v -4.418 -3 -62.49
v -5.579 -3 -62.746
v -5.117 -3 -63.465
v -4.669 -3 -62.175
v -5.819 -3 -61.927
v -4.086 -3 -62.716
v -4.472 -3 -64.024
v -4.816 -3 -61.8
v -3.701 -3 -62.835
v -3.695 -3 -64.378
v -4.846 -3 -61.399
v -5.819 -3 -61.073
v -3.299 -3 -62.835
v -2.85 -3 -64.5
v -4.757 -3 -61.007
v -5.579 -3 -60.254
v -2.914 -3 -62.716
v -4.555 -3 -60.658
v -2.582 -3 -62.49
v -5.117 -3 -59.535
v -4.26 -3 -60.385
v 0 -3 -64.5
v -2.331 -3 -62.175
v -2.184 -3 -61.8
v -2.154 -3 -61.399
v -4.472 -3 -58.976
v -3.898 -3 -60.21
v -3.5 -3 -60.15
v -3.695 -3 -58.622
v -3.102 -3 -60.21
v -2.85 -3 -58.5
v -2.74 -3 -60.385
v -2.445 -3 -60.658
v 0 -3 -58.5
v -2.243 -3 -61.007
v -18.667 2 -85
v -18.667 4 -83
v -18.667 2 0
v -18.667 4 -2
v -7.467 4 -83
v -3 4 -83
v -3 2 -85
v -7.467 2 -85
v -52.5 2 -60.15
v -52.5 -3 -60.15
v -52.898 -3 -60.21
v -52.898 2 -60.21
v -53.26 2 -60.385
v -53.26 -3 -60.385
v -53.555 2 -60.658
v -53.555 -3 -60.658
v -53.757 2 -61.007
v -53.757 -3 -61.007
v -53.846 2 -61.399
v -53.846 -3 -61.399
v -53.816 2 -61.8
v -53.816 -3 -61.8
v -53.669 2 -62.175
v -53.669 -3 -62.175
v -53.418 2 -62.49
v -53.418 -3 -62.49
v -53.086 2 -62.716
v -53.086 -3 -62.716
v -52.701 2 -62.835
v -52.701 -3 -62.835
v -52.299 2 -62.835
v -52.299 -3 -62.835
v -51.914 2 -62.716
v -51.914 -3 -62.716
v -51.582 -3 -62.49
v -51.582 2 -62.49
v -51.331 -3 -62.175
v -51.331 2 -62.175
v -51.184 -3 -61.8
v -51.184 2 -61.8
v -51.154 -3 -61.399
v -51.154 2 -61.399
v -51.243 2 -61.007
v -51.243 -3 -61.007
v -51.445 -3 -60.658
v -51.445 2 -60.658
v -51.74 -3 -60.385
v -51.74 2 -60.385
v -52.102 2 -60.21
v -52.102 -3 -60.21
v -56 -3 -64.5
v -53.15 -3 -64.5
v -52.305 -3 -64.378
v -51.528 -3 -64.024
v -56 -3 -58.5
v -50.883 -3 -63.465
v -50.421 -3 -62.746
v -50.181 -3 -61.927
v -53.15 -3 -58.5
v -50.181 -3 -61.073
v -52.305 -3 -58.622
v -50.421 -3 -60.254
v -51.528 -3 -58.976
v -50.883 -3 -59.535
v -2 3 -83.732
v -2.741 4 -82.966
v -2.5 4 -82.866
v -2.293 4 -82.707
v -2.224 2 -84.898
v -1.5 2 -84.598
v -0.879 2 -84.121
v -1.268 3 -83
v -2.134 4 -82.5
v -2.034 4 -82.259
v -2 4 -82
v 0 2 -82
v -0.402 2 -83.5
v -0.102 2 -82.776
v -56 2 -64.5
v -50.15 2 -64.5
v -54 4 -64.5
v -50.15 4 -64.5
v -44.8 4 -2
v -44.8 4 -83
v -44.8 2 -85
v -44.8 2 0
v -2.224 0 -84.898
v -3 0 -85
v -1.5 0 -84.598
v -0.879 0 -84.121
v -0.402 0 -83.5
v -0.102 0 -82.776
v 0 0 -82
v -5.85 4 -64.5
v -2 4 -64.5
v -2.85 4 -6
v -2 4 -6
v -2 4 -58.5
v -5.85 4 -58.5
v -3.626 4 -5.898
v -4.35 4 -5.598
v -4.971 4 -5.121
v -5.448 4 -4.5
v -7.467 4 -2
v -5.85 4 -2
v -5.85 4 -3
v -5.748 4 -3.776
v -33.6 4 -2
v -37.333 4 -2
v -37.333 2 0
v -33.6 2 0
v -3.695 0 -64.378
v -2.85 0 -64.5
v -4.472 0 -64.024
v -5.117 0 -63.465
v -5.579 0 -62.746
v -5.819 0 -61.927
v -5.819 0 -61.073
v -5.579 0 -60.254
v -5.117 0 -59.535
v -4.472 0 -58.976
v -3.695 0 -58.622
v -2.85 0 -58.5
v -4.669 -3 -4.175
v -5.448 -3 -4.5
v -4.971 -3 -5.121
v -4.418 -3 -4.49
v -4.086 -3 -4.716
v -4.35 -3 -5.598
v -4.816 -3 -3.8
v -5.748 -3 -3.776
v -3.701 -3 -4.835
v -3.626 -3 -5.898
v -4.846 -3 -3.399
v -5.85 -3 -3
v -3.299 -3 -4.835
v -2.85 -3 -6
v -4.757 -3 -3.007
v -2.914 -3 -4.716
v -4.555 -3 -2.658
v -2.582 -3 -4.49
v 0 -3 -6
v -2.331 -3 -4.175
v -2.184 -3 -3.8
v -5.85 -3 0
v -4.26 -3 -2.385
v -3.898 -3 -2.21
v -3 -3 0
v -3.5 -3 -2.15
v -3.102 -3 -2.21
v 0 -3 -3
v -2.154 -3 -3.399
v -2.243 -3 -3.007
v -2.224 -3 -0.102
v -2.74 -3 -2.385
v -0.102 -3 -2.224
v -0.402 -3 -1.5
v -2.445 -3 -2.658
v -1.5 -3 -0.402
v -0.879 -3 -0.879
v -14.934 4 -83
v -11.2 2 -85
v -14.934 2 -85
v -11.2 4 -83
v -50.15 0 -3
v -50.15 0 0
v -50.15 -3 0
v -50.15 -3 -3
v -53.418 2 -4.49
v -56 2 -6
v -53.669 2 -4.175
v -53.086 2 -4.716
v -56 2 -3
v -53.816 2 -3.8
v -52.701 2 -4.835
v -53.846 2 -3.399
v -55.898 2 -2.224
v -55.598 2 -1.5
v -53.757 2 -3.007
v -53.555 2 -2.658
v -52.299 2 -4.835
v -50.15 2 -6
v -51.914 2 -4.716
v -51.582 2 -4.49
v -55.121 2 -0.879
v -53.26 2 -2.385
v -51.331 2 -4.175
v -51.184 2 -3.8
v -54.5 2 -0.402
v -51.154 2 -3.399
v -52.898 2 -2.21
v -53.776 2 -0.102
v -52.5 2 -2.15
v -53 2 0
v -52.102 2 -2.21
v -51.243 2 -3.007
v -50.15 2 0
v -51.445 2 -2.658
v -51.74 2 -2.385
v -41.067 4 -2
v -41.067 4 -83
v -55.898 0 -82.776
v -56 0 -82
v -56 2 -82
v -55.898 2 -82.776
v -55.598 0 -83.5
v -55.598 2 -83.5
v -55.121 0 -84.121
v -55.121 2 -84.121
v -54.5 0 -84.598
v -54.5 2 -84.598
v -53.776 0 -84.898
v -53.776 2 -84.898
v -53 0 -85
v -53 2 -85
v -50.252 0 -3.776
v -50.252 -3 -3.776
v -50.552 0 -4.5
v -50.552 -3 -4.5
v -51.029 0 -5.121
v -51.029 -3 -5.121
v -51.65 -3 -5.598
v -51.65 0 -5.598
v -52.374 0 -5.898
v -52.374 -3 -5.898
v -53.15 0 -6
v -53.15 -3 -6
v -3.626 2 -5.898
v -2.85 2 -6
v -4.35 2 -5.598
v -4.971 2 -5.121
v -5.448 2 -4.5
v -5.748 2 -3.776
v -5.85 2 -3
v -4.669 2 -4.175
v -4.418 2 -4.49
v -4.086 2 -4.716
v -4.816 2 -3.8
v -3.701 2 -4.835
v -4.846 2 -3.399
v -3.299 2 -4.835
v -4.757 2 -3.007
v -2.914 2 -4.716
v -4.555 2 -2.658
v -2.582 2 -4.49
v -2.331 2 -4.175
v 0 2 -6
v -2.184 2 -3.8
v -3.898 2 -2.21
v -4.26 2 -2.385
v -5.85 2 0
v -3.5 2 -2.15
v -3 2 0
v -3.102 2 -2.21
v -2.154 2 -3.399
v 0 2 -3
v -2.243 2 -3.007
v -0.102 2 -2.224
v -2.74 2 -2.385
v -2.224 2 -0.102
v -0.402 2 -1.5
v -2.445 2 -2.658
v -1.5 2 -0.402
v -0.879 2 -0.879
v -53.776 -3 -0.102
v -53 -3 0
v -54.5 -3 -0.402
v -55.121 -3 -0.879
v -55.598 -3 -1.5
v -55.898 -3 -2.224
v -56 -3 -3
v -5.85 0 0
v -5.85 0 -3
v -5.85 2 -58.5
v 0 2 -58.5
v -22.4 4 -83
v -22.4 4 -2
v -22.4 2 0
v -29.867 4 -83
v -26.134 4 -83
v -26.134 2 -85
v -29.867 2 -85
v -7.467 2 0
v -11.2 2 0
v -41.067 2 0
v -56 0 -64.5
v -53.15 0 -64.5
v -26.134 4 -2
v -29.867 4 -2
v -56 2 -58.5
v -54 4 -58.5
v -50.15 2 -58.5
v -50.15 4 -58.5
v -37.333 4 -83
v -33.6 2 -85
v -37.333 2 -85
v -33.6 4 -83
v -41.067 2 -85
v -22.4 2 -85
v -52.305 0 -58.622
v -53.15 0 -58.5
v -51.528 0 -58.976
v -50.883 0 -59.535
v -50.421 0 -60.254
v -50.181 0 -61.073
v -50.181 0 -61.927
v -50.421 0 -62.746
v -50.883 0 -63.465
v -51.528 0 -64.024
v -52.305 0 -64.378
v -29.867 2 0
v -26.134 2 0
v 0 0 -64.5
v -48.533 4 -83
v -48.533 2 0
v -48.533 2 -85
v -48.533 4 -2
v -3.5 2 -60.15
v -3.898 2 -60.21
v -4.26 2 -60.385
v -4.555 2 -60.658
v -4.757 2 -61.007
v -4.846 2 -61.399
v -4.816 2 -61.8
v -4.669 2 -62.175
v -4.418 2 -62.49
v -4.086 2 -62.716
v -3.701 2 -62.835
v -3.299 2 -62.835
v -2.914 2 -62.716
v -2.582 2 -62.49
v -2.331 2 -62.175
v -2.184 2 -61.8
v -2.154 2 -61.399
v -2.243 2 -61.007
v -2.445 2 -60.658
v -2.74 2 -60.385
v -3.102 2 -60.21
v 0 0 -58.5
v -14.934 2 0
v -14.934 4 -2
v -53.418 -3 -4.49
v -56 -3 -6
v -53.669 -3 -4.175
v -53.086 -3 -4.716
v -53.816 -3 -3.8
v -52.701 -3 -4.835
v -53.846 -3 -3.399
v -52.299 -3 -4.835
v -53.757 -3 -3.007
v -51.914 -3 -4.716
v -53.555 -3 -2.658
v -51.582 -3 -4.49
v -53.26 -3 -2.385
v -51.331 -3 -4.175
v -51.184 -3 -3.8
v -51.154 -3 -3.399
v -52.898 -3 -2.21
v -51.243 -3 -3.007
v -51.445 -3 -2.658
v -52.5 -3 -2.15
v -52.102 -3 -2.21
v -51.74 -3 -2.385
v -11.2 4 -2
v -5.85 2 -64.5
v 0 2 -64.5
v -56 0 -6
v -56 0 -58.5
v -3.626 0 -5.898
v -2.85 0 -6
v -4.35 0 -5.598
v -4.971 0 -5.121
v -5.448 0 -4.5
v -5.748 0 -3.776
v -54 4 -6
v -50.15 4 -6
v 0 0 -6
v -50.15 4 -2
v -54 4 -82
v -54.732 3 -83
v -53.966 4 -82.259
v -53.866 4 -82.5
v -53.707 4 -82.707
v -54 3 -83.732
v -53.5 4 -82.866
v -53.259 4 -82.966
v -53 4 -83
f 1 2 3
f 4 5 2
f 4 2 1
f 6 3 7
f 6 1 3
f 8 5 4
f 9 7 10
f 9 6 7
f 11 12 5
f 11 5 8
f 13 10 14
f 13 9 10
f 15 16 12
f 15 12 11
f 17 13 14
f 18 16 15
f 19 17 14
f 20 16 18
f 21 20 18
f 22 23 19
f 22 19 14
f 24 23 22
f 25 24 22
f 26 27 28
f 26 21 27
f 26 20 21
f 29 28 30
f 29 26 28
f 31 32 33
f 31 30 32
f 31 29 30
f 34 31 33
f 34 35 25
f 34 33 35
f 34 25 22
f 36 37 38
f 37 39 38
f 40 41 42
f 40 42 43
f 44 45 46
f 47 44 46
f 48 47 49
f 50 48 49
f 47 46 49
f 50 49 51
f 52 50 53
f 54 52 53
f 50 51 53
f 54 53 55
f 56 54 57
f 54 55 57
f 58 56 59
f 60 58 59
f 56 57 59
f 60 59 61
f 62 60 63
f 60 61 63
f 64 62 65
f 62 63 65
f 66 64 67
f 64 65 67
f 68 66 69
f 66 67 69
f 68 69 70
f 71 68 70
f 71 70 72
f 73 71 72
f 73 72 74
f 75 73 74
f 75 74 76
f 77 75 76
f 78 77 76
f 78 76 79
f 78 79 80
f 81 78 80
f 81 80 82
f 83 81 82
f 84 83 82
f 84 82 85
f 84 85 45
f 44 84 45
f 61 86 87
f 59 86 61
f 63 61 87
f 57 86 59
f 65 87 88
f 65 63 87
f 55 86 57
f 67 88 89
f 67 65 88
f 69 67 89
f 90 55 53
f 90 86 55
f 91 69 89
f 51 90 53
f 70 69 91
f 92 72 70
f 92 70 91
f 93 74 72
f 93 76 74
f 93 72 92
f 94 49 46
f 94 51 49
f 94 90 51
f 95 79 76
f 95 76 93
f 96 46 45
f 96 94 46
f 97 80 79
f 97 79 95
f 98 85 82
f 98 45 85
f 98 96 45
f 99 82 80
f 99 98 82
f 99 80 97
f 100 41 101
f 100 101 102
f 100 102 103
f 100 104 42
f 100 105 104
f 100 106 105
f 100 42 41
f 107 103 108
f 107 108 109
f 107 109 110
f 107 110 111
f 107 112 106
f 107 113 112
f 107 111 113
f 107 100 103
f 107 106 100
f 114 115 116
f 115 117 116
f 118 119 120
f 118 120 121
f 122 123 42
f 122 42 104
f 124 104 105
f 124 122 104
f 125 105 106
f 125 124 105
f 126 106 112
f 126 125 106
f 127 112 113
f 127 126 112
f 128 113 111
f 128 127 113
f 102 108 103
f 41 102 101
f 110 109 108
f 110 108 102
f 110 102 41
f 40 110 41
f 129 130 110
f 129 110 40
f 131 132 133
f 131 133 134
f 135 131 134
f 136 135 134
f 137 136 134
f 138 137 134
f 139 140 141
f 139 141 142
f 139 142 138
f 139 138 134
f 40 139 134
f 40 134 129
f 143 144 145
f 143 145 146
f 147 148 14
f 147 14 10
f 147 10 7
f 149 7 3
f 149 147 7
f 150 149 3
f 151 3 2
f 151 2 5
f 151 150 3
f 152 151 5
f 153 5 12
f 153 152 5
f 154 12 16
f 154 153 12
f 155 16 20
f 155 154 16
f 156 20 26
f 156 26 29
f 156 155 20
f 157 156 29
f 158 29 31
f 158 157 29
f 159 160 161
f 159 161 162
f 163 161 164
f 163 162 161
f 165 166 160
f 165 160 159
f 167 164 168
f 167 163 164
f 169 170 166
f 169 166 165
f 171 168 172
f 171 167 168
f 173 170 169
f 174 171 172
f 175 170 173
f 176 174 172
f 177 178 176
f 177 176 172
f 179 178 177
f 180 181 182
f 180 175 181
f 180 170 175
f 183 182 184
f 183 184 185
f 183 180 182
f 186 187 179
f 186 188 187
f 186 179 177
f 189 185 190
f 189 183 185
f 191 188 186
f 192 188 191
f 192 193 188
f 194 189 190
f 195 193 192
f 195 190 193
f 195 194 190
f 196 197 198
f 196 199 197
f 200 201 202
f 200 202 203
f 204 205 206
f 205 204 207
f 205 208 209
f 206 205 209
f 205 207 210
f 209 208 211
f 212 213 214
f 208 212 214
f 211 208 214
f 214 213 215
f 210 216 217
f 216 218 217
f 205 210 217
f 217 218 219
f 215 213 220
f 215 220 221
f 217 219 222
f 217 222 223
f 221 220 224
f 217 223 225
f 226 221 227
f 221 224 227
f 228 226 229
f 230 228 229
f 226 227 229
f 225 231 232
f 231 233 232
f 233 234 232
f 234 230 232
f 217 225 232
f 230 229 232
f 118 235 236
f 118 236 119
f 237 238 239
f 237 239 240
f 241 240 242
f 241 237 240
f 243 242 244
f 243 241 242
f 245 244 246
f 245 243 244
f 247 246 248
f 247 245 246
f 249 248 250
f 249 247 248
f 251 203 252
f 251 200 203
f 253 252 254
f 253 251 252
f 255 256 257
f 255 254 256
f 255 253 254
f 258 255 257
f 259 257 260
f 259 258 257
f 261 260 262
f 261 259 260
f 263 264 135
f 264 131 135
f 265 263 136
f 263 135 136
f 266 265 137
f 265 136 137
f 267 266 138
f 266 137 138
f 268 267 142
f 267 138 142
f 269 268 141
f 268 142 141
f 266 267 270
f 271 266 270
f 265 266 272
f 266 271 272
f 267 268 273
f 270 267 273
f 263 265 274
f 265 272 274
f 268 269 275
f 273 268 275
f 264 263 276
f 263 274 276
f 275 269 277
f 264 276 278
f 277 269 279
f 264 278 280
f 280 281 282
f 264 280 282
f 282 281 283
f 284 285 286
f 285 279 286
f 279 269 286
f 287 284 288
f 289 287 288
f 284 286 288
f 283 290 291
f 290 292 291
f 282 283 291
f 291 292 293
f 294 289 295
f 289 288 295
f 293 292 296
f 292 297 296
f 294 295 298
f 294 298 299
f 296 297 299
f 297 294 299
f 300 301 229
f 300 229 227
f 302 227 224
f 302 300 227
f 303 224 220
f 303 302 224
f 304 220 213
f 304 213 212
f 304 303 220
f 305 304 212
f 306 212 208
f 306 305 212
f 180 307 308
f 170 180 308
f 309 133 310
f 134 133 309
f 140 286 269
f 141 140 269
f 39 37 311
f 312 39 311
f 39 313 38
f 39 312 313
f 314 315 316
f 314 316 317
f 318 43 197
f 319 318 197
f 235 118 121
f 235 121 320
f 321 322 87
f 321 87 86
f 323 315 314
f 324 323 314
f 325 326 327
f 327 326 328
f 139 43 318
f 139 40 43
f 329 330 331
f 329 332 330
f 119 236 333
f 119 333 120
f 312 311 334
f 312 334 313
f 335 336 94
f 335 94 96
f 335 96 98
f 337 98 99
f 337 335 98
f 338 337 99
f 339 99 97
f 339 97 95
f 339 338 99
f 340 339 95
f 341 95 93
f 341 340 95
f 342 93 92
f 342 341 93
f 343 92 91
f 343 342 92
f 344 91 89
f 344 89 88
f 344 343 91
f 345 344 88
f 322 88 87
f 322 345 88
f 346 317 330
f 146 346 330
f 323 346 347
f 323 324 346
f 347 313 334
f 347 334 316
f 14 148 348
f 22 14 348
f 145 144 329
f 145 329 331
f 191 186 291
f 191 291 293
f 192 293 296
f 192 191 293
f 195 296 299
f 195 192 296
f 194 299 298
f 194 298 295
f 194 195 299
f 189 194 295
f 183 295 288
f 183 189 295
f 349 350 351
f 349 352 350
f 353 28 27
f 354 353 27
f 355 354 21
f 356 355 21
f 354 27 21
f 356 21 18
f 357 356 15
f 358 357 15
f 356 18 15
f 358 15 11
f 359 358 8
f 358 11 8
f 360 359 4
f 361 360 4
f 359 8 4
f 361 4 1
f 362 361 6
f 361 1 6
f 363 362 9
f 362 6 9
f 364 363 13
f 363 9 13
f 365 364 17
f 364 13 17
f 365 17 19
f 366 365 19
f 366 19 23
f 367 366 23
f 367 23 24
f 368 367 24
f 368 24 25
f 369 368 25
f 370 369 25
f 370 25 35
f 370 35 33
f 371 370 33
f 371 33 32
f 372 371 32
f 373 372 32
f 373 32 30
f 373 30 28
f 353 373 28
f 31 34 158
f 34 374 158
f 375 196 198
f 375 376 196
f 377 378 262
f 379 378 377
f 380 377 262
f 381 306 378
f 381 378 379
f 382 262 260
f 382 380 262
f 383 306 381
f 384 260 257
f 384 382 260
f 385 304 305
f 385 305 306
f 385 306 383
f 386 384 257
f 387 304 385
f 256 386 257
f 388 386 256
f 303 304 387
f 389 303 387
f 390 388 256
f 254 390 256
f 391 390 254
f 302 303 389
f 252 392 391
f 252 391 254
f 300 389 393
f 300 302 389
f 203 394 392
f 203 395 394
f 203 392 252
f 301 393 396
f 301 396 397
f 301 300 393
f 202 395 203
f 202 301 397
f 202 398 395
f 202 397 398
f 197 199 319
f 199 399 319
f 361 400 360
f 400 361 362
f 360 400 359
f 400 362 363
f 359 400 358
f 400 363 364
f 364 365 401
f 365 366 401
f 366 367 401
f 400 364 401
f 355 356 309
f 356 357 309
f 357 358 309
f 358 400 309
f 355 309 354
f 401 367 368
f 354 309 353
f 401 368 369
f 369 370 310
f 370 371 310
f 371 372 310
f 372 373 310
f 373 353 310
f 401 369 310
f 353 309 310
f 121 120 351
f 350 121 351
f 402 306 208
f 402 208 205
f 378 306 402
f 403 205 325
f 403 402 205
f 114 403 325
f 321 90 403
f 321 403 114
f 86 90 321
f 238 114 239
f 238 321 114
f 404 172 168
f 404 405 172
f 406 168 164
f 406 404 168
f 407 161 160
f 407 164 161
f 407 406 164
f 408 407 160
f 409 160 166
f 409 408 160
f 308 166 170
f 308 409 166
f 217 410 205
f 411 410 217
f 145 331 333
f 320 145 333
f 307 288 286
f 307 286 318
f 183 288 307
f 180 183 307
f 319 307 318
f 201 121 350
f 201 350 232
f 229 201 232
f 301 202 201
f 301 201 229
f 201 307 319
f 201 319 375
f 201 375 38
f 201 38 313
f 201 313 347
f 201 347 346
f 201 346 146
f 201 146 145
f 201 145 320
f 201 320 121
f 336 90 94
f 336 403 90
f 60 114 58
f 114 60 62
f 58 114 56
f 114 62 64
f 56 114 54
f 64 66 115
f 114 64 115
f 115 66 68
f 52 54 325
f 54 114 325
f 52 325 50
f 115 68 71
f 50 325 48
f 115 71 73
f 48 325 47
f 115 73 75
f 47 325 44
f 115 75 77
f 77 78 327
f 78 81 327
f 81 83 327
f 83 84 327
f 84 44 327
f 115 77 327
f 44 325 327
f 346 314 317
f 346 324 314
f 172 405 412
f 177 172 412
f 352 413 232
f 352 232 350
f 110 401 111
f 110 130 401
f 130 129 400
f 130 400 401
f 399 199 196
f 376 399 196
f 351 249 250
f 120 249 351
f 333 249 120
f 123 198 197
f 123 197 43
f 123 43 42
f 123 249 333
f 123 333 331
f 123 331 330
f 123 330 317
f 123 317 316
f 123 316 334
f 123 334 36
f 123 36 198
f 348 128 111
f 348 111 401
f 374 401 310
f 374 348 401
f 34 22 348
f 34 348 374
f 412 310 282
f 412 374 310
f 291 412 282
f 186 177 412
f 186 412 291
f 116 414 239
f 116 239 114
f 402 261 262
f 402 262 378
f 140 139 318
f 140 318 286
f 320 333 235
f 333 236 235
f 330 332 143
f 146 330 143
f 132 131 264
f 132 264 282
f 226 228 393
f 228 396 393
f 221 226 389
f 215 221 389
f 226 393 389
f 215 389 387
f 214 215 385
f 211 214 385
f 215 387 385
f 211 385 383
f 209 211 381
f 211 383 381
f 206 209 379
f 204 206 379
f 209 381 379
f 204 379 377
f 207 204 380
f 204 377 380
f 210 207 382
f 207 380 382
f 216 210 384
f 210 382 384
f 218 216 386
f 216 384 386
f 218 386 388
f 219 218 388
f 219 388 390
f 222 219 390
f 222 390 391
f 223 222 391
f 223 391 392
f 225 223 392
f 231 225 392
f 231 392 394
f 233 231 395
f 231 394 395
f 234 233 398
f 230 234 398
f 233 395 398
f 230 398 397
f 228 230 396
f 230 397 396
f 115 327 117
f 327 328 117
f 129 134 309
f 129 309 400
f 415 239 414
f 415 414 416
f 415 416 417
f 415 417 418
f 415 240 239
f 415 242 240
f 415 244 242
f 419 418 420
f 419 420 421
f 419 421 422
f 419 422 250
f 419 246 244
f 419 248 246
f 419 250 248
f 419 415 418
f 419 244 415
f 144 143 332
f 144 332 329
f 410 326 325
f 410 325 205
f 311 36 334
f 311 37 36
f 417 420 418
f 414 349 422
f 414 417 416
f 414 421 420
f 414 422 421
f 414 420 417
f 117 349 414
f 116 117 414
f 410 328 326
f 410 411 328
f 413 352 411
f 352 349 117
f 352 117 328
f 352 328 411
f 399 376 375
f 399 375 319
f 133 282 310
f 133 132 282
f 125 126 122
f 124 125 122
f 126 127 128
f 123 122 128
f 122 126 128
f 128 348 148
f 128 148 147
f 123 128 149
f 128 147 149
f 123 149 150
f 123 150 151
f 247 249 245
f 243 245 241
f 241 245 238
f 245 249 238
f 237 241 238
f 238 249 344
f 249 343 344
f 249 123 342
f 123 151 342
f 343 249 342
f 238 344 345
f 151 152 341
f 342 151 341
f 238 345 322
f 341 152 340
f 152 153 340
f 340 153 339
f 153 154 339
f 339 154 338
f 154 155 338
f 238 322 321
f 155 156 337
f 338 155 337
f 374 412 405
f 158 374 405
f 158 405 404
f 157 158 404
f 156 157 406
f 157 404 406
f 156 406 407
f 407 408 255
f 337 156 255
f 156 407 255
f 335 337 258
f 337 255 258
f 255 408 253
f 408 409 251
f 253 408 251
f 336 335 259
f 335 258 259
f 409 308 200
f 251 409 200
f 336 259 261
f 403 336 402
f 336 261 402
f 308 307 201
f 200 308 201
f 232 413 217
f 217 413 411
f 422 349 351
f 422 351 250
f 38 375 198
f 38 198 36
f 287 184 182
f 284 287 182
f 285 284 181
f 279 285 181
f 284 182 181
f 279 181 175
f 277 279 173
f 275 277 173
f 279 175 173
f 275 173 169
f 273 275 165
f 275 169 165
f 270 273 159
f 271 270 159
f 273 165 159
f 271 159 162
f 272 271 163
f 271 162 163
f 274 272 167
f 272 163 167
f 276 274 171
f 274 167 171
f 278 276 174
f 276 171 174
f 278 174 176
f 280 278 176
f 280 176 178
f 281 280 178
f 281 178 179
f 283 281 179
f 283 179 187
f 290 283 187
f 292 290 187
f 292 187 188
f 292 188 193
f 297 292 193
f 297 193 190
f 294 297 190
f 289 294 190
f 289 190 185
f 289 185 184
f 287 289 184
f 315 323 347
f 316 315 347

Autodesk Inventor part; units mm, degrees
ref_plane "YZ Plane" through (0, 0, 0) normal (1, 0, 0) x (0, 1, 0)
ref_plane "XZ Plane" through (0, 0, 0) normal (0, 1, 0) x (-1, 0, 0)
ref_plane "XY Plane" through (0, 0, 0) normal (0, 0, 1) x (1, 0, 0)
sketch "Sketch1" plane through (0, 0, 0) normal (0, 1, 0) x (-1, 0, 0)
  line L0 (3, 0) -> (53, 0)
  line L1 (56, -3) -> (56, -82)
  line L2 (53, -85) -> (3, -85)
  line L3 (0, -82) -> (0, -3)
  arc A0 (56, -3) -> (53, 0) centre (53, -3) ccw
  arc A1 (53, -85) -> (56, -82) centre (53, -82) ccw
  arc A2 (0, -82) -> (3, -85) centre (3, -82) ccw
  arc A3 (3, 0) -> (0, -3) centre (3, -3) ccw
  point P0 (0, 0)
  point P1 (56, 0)
  point P2 (0, -85)
  dimension "d0" = 56
  dimension "d1" = 85
  dimension "d2" = 3
extrude "Extrusion1" add sketch "Sketch1" along normal blind 4
chamfer "Chamfer1" distance 2 angle 45 8 edges at (0, 4, -42.5) (-0.8787, 4, -84.1213) (-28, 4, -85) (-55.1213, 4, -84.1213) (-56, 4, -42.5) (-55.1213, 4, -0.8787) (-28, 4, 0) (-0.8787, 4, -0.8787)
sketch "Sketch2" plane through (0, 0, 0) normal (0, 1, 0) x (-1, 0, 0)
  line L0 (53, 0) -> (3, 0) projected
  line L1 (3, -85) -> (53, -85) projected
  line L2 (44.8, 0) -> (48.5333, 0)
  line L3 (48.5333, 0) -> (48.5333, -85)
  line L4 (48.5333, -85) -> (44.8, -85)
  line L5 (44.8, -85) -> (44.8, 0)
  line L6 (56, -82) -> (56, -3) projected
  line L7 (41.0667, 0) -> (44.8, 0)
  line L8 (44.8, 0) -> (44.8, -85)
  line L9 (44.8, -85) -> (41.0667, -85)
  line L10 (41.0667, -85) -> (41.0667, 0)
  line L11 (37.3334, 0) -> (41.0667, 0)
  line L12 (41.0667, 0) -> (41.0667, -85)
  line L13 (41.0667, -85) -> (37.3334, -85)
  line L14 (37.3334, -85) -> (37.3334, 0)
  line L15 (33.6001, 0) -> (37.3334, 0)
  line L16 (37.3334, 0) -> (37.3334, -85)
  line L17 (37.3334, -85) -> (33.6001, -85)
  line L18 (33.6001, -85) -> (33.6001, 0)
  line L19 (29.8668, 0) -> (33.6001, 0)
  line L20 (33.6001, 0) -> (33.6001, -85)
  line L21 (33.6001, -85) -> (29.8668, -85)
  line L22 (29.8668, -85) -> (29.8668, 0)
  line L23 (26.1335, 0) -> (29.8668, 0)
  line L24 (29.8668, 0) -> (29.8668, -85)
  line L25 (29.8668, -85) -> (26.1335, -85)
  line L26 (26.1335, -85) -> (26.1335, 0)
  line L27 (22.4002, 0) -> (26.1335, 0)
  line L28 (26.1335, 0) -> (26.1335, -85)
  line L29 (26.1335, -85) -> (22.4002, -85)
  line L30 (22.4002, -85) -> (22.4002, 0)
  line L31 (18.6669, 0) -> (22.4002, 0)
  line L32 (22.4002, 0) -> (22.4002, -85)
  line L33 (22.4002, -85) -> (18.6669, -85)
  line L34 (18.6669, -85) -> (18.6669, 0)
  line L35 (14.9336, 0) -> (18.6669, 0)
  line L36 (18.6669, 0) -> (18.6669, -85)
  line L37 (18.6669, -85) -> (14.9336, -85)
  line L38 (14.9336, -85) -> (14.9336, 0)
  line L39 (11.2003, 0) -> (14.9336, 0)
  line L40 (14.9336, 0) -> (14.9336, -85)
  line L41 (14.9336, -85) -> (11.2003, -85)
  line L42 (11.2003, -85) -> (11.2003, 0)
  line L43 (7.467, 0) -> (11.2003, 0)
  line L44 (11.2003, 0) -> (11.2003, -85)
  line L45 (11.2003, -85) -> (7.467, -85)
  line L46 (7.467, -85) -> (7.467, 0)
  point P0 (0, 0)
  dimension "d8" = 7.4667
  dimension "d9" = 3.7333
  dimension "d12" = 3.7333
extrude "Extrusion2" cut sketch "Sketch2" against normal blind 2 from surface at 4 contours L3 L1 L5 L0 | L10 L1 L14 L0 | L18 L1 L22 L0 | L26 L1 L30 L0 | L34 L1 L38 L0 | L42 L1 L46 L0
sketch "Sketch3" plane through (0, 0, 0) normal (0, -1, 0) x (1, 0, 0)
  line L0 (-3, 0) -> (-5.85, 0)
  line L1 (-5.85, 0) -> (-5.85, -3)
  line L2 (-2.85, -6) -> (0, -6)
  line L3 (0, -6) -> (0, -3)
  line L4 (0, -3) -> (0, -82) projected
  line L5 (0, -58.5) -> (-4.467, -58.5)
  line L6 (-5.85, -64.5) -> (-5.85, -64.5)
  line L7 (-4.467, -64.5) -> (0, -64.5)
  line L8 (0, -64.5) -> (0, -58.5)
  line L9 (-28, 0) -> (-28, -85) construction
  line L10 (-53, 0) -> (-3, 0) projected
  line L11 (-3, -85) -> (-53, -85) projected
  arc A0 (0, -3) -> (-3, 0) centre (-3, -3) ccw
  arc A1 (-5.85, -3) -> (-2.85, -6) centre (-2.85, -3) ccw
  line L12 (0, -6) -> (-5.85, -6)
  line L13 (0, -58.5) -> (-2.85, -58.5)
  line L14 (-2.85, -64.5) -> (0, -64.5)
  line L15 (-5.85, -61.5) -> (-5.85, -61.5)
  arc A2 (-2.85, -58.5) -> (-5.85, -61.5) centre (-2.85, -61.5) ccw
  arc A3 (-5.85, -61.5) -> (-2.85, -64.5) centre (-2.85, -61.5) ccw
  line L16 (0, -58.5) -> (-5.85, -58.5)
  line L17 (-5.85, -58.5) -> (-5.85, -64.5)
  line L18 (-5.85, -64.5) -> (0, -64.5)
  line L19 (0, -3) -> (0, -82) projected
  line L20 (-5.85, -6) -> (-5.85, 0)
  line L21 (-53, 0) -> (-50.15, 0)
  line L22 (-50.15, 0) -> (-50.15, -3)
  line L23 (-53.15, -6) -> (-56, -6)
  line L24 (-56, -6) -> (-56, -3)
  line L25 (-56, -58.5) -> (-51.533, -58.5)
  line L26 (-50.15, -64.5) -> (-50.15, -64.5)
  line L27 (-51.533, -64.5) -> (-56, -64.5)
  line L28 (-56, -64.5) -> (-56, -58.5)
  arc A4 (-53, 0) -> (-56, -3) centre (-53, -3) ccw
  arc A5 (-53.15, -6) -> (-50.15, -3) centre (-53.15, -3) ccw
  line L29 (-56, -6) -> (-50.15, -6)
  line L30 (-56, -58.5) -> (-53.15, -58.5)
  line L31 (-53.15, -64.5) -> (-56, -64.5)
  line L32 (-50.15, -61.5) -> (-50.15, -61.5)
  arc A6 (-50.15, -61.5) -> (-53.15, -58.5) centre (-53.15, -61.5) ccw
  arc A7 (-53.15, -64.5) -> (-50.15, -61.5) centre (-53.15, -61.5) ccw
  line L33 (-56, -58.5) -> (-50.15, -58.5)
  line L34 (-50.15, -58.5) -> (-50.15, -64.5)
  line L35 (-50.15, -64.5) -> (-56, -64.5)
  line L36 (-50.15, -6) -> (-50.15, 0)
  point P0 (0, 0)
  point P1 (-7.467, 0)
  point P2 (-2.2335, -58.5)
  point P3 (0, -64.5)
  point P4 (-7.467, -2)
  point P5 (-56, 0)
  point P6 (-48.533, 0)
  point P7 (-56, -3)
  point P8 (-53.7665, -58.5)
  point P9 (-53, 0)
  point P10 (-48.533, -2)
  point P11 (-53.15, -58.5)
  point P12 (-5.85, -61.5)
  point P13 (-2.85, -64.5)
  point P14 (-2.85, -58.5)
  point P15 (-50.15, 0)
  point P16 (-2.85, -6)
  dimension "d19" = 6
  dimension "d21" = 58.5
  dimension "d22" = 6
  dimension "d25" = 28
  dimension "d26" = 3
  dimension "d29" = 3
  dimension "d30" = 3
  dimension "d48" = 5.85
extrude "Extrusion3" add sketch "Sketch3" along normal blind 3 contours A0 L3 L2 A1 L1 L0 | L4 L7 A3 A2 L5 | L22 A5 L23 L24 A4 L10 | L25 A6 A7 L27 L28
extrude "Extrusion4" cut sketch "Sketch3" along normal blind 2 from surface at -4 contours A0 L3 L2 A1 L1 L0 | L4 L7 A3 A2 L5 | L22 A5 L23 L24 A4 L10 | L36 L29 A5 | A2 L17 L16 L5 | L7 L18 L17 A3 | L25 A6 A7 L27 L28 | L25 L33 L34 A6 | L34 L35 L27 A7
sketch "Sketch4" plane through (-53, 2, 0) normal (0, 1, 0) x (1, 0, 0)
  line L0 (-0.15, 58.5) -> (-3, 58.5) projected
  line L1 (-3, 64.5) -> (-3, 58.5) projected
  line L2 (-3, 6) -> (-3, 3) projected
  line L3 (0, 0) -> (2.85, 0) projected
  line L4 (47.15, 0) -> (50, 0) projected
  line L5 (53, 3) -> (53, 6) projected
  line L6 (53, 58.5) -> (53, 64.5) projected
  line L7 (50.15, 64.5) -> (53, 64.5) projected
  point P0 (0.5, 3.5)
  point P1 (0.5, 61.5)
  point P2 (49.5, 61.5)
  point P3 (49.5, 3.5)
  dimension "d49" = 3
  dimension "d50" = 3.5
  dimension "d51" = 3.5
  dimension "d52" = 3.5
  dimension "d53" = 3.5
  dimension "d54" = 3.5
  dimension "d55" = 3.5
  dimension "d56" = 3
hole "Hole1" at (-52.5, 2, -3.5) at (-52.5, 2, -61.5) at (-3.5, 2, -61.5) at (-3.5, 2, -3.5) direction (0, -1, 0) diameter 2.7 end through all
properties part number "Raspberry-Pi-4B heatsink1" material "Aluminum 6061"
